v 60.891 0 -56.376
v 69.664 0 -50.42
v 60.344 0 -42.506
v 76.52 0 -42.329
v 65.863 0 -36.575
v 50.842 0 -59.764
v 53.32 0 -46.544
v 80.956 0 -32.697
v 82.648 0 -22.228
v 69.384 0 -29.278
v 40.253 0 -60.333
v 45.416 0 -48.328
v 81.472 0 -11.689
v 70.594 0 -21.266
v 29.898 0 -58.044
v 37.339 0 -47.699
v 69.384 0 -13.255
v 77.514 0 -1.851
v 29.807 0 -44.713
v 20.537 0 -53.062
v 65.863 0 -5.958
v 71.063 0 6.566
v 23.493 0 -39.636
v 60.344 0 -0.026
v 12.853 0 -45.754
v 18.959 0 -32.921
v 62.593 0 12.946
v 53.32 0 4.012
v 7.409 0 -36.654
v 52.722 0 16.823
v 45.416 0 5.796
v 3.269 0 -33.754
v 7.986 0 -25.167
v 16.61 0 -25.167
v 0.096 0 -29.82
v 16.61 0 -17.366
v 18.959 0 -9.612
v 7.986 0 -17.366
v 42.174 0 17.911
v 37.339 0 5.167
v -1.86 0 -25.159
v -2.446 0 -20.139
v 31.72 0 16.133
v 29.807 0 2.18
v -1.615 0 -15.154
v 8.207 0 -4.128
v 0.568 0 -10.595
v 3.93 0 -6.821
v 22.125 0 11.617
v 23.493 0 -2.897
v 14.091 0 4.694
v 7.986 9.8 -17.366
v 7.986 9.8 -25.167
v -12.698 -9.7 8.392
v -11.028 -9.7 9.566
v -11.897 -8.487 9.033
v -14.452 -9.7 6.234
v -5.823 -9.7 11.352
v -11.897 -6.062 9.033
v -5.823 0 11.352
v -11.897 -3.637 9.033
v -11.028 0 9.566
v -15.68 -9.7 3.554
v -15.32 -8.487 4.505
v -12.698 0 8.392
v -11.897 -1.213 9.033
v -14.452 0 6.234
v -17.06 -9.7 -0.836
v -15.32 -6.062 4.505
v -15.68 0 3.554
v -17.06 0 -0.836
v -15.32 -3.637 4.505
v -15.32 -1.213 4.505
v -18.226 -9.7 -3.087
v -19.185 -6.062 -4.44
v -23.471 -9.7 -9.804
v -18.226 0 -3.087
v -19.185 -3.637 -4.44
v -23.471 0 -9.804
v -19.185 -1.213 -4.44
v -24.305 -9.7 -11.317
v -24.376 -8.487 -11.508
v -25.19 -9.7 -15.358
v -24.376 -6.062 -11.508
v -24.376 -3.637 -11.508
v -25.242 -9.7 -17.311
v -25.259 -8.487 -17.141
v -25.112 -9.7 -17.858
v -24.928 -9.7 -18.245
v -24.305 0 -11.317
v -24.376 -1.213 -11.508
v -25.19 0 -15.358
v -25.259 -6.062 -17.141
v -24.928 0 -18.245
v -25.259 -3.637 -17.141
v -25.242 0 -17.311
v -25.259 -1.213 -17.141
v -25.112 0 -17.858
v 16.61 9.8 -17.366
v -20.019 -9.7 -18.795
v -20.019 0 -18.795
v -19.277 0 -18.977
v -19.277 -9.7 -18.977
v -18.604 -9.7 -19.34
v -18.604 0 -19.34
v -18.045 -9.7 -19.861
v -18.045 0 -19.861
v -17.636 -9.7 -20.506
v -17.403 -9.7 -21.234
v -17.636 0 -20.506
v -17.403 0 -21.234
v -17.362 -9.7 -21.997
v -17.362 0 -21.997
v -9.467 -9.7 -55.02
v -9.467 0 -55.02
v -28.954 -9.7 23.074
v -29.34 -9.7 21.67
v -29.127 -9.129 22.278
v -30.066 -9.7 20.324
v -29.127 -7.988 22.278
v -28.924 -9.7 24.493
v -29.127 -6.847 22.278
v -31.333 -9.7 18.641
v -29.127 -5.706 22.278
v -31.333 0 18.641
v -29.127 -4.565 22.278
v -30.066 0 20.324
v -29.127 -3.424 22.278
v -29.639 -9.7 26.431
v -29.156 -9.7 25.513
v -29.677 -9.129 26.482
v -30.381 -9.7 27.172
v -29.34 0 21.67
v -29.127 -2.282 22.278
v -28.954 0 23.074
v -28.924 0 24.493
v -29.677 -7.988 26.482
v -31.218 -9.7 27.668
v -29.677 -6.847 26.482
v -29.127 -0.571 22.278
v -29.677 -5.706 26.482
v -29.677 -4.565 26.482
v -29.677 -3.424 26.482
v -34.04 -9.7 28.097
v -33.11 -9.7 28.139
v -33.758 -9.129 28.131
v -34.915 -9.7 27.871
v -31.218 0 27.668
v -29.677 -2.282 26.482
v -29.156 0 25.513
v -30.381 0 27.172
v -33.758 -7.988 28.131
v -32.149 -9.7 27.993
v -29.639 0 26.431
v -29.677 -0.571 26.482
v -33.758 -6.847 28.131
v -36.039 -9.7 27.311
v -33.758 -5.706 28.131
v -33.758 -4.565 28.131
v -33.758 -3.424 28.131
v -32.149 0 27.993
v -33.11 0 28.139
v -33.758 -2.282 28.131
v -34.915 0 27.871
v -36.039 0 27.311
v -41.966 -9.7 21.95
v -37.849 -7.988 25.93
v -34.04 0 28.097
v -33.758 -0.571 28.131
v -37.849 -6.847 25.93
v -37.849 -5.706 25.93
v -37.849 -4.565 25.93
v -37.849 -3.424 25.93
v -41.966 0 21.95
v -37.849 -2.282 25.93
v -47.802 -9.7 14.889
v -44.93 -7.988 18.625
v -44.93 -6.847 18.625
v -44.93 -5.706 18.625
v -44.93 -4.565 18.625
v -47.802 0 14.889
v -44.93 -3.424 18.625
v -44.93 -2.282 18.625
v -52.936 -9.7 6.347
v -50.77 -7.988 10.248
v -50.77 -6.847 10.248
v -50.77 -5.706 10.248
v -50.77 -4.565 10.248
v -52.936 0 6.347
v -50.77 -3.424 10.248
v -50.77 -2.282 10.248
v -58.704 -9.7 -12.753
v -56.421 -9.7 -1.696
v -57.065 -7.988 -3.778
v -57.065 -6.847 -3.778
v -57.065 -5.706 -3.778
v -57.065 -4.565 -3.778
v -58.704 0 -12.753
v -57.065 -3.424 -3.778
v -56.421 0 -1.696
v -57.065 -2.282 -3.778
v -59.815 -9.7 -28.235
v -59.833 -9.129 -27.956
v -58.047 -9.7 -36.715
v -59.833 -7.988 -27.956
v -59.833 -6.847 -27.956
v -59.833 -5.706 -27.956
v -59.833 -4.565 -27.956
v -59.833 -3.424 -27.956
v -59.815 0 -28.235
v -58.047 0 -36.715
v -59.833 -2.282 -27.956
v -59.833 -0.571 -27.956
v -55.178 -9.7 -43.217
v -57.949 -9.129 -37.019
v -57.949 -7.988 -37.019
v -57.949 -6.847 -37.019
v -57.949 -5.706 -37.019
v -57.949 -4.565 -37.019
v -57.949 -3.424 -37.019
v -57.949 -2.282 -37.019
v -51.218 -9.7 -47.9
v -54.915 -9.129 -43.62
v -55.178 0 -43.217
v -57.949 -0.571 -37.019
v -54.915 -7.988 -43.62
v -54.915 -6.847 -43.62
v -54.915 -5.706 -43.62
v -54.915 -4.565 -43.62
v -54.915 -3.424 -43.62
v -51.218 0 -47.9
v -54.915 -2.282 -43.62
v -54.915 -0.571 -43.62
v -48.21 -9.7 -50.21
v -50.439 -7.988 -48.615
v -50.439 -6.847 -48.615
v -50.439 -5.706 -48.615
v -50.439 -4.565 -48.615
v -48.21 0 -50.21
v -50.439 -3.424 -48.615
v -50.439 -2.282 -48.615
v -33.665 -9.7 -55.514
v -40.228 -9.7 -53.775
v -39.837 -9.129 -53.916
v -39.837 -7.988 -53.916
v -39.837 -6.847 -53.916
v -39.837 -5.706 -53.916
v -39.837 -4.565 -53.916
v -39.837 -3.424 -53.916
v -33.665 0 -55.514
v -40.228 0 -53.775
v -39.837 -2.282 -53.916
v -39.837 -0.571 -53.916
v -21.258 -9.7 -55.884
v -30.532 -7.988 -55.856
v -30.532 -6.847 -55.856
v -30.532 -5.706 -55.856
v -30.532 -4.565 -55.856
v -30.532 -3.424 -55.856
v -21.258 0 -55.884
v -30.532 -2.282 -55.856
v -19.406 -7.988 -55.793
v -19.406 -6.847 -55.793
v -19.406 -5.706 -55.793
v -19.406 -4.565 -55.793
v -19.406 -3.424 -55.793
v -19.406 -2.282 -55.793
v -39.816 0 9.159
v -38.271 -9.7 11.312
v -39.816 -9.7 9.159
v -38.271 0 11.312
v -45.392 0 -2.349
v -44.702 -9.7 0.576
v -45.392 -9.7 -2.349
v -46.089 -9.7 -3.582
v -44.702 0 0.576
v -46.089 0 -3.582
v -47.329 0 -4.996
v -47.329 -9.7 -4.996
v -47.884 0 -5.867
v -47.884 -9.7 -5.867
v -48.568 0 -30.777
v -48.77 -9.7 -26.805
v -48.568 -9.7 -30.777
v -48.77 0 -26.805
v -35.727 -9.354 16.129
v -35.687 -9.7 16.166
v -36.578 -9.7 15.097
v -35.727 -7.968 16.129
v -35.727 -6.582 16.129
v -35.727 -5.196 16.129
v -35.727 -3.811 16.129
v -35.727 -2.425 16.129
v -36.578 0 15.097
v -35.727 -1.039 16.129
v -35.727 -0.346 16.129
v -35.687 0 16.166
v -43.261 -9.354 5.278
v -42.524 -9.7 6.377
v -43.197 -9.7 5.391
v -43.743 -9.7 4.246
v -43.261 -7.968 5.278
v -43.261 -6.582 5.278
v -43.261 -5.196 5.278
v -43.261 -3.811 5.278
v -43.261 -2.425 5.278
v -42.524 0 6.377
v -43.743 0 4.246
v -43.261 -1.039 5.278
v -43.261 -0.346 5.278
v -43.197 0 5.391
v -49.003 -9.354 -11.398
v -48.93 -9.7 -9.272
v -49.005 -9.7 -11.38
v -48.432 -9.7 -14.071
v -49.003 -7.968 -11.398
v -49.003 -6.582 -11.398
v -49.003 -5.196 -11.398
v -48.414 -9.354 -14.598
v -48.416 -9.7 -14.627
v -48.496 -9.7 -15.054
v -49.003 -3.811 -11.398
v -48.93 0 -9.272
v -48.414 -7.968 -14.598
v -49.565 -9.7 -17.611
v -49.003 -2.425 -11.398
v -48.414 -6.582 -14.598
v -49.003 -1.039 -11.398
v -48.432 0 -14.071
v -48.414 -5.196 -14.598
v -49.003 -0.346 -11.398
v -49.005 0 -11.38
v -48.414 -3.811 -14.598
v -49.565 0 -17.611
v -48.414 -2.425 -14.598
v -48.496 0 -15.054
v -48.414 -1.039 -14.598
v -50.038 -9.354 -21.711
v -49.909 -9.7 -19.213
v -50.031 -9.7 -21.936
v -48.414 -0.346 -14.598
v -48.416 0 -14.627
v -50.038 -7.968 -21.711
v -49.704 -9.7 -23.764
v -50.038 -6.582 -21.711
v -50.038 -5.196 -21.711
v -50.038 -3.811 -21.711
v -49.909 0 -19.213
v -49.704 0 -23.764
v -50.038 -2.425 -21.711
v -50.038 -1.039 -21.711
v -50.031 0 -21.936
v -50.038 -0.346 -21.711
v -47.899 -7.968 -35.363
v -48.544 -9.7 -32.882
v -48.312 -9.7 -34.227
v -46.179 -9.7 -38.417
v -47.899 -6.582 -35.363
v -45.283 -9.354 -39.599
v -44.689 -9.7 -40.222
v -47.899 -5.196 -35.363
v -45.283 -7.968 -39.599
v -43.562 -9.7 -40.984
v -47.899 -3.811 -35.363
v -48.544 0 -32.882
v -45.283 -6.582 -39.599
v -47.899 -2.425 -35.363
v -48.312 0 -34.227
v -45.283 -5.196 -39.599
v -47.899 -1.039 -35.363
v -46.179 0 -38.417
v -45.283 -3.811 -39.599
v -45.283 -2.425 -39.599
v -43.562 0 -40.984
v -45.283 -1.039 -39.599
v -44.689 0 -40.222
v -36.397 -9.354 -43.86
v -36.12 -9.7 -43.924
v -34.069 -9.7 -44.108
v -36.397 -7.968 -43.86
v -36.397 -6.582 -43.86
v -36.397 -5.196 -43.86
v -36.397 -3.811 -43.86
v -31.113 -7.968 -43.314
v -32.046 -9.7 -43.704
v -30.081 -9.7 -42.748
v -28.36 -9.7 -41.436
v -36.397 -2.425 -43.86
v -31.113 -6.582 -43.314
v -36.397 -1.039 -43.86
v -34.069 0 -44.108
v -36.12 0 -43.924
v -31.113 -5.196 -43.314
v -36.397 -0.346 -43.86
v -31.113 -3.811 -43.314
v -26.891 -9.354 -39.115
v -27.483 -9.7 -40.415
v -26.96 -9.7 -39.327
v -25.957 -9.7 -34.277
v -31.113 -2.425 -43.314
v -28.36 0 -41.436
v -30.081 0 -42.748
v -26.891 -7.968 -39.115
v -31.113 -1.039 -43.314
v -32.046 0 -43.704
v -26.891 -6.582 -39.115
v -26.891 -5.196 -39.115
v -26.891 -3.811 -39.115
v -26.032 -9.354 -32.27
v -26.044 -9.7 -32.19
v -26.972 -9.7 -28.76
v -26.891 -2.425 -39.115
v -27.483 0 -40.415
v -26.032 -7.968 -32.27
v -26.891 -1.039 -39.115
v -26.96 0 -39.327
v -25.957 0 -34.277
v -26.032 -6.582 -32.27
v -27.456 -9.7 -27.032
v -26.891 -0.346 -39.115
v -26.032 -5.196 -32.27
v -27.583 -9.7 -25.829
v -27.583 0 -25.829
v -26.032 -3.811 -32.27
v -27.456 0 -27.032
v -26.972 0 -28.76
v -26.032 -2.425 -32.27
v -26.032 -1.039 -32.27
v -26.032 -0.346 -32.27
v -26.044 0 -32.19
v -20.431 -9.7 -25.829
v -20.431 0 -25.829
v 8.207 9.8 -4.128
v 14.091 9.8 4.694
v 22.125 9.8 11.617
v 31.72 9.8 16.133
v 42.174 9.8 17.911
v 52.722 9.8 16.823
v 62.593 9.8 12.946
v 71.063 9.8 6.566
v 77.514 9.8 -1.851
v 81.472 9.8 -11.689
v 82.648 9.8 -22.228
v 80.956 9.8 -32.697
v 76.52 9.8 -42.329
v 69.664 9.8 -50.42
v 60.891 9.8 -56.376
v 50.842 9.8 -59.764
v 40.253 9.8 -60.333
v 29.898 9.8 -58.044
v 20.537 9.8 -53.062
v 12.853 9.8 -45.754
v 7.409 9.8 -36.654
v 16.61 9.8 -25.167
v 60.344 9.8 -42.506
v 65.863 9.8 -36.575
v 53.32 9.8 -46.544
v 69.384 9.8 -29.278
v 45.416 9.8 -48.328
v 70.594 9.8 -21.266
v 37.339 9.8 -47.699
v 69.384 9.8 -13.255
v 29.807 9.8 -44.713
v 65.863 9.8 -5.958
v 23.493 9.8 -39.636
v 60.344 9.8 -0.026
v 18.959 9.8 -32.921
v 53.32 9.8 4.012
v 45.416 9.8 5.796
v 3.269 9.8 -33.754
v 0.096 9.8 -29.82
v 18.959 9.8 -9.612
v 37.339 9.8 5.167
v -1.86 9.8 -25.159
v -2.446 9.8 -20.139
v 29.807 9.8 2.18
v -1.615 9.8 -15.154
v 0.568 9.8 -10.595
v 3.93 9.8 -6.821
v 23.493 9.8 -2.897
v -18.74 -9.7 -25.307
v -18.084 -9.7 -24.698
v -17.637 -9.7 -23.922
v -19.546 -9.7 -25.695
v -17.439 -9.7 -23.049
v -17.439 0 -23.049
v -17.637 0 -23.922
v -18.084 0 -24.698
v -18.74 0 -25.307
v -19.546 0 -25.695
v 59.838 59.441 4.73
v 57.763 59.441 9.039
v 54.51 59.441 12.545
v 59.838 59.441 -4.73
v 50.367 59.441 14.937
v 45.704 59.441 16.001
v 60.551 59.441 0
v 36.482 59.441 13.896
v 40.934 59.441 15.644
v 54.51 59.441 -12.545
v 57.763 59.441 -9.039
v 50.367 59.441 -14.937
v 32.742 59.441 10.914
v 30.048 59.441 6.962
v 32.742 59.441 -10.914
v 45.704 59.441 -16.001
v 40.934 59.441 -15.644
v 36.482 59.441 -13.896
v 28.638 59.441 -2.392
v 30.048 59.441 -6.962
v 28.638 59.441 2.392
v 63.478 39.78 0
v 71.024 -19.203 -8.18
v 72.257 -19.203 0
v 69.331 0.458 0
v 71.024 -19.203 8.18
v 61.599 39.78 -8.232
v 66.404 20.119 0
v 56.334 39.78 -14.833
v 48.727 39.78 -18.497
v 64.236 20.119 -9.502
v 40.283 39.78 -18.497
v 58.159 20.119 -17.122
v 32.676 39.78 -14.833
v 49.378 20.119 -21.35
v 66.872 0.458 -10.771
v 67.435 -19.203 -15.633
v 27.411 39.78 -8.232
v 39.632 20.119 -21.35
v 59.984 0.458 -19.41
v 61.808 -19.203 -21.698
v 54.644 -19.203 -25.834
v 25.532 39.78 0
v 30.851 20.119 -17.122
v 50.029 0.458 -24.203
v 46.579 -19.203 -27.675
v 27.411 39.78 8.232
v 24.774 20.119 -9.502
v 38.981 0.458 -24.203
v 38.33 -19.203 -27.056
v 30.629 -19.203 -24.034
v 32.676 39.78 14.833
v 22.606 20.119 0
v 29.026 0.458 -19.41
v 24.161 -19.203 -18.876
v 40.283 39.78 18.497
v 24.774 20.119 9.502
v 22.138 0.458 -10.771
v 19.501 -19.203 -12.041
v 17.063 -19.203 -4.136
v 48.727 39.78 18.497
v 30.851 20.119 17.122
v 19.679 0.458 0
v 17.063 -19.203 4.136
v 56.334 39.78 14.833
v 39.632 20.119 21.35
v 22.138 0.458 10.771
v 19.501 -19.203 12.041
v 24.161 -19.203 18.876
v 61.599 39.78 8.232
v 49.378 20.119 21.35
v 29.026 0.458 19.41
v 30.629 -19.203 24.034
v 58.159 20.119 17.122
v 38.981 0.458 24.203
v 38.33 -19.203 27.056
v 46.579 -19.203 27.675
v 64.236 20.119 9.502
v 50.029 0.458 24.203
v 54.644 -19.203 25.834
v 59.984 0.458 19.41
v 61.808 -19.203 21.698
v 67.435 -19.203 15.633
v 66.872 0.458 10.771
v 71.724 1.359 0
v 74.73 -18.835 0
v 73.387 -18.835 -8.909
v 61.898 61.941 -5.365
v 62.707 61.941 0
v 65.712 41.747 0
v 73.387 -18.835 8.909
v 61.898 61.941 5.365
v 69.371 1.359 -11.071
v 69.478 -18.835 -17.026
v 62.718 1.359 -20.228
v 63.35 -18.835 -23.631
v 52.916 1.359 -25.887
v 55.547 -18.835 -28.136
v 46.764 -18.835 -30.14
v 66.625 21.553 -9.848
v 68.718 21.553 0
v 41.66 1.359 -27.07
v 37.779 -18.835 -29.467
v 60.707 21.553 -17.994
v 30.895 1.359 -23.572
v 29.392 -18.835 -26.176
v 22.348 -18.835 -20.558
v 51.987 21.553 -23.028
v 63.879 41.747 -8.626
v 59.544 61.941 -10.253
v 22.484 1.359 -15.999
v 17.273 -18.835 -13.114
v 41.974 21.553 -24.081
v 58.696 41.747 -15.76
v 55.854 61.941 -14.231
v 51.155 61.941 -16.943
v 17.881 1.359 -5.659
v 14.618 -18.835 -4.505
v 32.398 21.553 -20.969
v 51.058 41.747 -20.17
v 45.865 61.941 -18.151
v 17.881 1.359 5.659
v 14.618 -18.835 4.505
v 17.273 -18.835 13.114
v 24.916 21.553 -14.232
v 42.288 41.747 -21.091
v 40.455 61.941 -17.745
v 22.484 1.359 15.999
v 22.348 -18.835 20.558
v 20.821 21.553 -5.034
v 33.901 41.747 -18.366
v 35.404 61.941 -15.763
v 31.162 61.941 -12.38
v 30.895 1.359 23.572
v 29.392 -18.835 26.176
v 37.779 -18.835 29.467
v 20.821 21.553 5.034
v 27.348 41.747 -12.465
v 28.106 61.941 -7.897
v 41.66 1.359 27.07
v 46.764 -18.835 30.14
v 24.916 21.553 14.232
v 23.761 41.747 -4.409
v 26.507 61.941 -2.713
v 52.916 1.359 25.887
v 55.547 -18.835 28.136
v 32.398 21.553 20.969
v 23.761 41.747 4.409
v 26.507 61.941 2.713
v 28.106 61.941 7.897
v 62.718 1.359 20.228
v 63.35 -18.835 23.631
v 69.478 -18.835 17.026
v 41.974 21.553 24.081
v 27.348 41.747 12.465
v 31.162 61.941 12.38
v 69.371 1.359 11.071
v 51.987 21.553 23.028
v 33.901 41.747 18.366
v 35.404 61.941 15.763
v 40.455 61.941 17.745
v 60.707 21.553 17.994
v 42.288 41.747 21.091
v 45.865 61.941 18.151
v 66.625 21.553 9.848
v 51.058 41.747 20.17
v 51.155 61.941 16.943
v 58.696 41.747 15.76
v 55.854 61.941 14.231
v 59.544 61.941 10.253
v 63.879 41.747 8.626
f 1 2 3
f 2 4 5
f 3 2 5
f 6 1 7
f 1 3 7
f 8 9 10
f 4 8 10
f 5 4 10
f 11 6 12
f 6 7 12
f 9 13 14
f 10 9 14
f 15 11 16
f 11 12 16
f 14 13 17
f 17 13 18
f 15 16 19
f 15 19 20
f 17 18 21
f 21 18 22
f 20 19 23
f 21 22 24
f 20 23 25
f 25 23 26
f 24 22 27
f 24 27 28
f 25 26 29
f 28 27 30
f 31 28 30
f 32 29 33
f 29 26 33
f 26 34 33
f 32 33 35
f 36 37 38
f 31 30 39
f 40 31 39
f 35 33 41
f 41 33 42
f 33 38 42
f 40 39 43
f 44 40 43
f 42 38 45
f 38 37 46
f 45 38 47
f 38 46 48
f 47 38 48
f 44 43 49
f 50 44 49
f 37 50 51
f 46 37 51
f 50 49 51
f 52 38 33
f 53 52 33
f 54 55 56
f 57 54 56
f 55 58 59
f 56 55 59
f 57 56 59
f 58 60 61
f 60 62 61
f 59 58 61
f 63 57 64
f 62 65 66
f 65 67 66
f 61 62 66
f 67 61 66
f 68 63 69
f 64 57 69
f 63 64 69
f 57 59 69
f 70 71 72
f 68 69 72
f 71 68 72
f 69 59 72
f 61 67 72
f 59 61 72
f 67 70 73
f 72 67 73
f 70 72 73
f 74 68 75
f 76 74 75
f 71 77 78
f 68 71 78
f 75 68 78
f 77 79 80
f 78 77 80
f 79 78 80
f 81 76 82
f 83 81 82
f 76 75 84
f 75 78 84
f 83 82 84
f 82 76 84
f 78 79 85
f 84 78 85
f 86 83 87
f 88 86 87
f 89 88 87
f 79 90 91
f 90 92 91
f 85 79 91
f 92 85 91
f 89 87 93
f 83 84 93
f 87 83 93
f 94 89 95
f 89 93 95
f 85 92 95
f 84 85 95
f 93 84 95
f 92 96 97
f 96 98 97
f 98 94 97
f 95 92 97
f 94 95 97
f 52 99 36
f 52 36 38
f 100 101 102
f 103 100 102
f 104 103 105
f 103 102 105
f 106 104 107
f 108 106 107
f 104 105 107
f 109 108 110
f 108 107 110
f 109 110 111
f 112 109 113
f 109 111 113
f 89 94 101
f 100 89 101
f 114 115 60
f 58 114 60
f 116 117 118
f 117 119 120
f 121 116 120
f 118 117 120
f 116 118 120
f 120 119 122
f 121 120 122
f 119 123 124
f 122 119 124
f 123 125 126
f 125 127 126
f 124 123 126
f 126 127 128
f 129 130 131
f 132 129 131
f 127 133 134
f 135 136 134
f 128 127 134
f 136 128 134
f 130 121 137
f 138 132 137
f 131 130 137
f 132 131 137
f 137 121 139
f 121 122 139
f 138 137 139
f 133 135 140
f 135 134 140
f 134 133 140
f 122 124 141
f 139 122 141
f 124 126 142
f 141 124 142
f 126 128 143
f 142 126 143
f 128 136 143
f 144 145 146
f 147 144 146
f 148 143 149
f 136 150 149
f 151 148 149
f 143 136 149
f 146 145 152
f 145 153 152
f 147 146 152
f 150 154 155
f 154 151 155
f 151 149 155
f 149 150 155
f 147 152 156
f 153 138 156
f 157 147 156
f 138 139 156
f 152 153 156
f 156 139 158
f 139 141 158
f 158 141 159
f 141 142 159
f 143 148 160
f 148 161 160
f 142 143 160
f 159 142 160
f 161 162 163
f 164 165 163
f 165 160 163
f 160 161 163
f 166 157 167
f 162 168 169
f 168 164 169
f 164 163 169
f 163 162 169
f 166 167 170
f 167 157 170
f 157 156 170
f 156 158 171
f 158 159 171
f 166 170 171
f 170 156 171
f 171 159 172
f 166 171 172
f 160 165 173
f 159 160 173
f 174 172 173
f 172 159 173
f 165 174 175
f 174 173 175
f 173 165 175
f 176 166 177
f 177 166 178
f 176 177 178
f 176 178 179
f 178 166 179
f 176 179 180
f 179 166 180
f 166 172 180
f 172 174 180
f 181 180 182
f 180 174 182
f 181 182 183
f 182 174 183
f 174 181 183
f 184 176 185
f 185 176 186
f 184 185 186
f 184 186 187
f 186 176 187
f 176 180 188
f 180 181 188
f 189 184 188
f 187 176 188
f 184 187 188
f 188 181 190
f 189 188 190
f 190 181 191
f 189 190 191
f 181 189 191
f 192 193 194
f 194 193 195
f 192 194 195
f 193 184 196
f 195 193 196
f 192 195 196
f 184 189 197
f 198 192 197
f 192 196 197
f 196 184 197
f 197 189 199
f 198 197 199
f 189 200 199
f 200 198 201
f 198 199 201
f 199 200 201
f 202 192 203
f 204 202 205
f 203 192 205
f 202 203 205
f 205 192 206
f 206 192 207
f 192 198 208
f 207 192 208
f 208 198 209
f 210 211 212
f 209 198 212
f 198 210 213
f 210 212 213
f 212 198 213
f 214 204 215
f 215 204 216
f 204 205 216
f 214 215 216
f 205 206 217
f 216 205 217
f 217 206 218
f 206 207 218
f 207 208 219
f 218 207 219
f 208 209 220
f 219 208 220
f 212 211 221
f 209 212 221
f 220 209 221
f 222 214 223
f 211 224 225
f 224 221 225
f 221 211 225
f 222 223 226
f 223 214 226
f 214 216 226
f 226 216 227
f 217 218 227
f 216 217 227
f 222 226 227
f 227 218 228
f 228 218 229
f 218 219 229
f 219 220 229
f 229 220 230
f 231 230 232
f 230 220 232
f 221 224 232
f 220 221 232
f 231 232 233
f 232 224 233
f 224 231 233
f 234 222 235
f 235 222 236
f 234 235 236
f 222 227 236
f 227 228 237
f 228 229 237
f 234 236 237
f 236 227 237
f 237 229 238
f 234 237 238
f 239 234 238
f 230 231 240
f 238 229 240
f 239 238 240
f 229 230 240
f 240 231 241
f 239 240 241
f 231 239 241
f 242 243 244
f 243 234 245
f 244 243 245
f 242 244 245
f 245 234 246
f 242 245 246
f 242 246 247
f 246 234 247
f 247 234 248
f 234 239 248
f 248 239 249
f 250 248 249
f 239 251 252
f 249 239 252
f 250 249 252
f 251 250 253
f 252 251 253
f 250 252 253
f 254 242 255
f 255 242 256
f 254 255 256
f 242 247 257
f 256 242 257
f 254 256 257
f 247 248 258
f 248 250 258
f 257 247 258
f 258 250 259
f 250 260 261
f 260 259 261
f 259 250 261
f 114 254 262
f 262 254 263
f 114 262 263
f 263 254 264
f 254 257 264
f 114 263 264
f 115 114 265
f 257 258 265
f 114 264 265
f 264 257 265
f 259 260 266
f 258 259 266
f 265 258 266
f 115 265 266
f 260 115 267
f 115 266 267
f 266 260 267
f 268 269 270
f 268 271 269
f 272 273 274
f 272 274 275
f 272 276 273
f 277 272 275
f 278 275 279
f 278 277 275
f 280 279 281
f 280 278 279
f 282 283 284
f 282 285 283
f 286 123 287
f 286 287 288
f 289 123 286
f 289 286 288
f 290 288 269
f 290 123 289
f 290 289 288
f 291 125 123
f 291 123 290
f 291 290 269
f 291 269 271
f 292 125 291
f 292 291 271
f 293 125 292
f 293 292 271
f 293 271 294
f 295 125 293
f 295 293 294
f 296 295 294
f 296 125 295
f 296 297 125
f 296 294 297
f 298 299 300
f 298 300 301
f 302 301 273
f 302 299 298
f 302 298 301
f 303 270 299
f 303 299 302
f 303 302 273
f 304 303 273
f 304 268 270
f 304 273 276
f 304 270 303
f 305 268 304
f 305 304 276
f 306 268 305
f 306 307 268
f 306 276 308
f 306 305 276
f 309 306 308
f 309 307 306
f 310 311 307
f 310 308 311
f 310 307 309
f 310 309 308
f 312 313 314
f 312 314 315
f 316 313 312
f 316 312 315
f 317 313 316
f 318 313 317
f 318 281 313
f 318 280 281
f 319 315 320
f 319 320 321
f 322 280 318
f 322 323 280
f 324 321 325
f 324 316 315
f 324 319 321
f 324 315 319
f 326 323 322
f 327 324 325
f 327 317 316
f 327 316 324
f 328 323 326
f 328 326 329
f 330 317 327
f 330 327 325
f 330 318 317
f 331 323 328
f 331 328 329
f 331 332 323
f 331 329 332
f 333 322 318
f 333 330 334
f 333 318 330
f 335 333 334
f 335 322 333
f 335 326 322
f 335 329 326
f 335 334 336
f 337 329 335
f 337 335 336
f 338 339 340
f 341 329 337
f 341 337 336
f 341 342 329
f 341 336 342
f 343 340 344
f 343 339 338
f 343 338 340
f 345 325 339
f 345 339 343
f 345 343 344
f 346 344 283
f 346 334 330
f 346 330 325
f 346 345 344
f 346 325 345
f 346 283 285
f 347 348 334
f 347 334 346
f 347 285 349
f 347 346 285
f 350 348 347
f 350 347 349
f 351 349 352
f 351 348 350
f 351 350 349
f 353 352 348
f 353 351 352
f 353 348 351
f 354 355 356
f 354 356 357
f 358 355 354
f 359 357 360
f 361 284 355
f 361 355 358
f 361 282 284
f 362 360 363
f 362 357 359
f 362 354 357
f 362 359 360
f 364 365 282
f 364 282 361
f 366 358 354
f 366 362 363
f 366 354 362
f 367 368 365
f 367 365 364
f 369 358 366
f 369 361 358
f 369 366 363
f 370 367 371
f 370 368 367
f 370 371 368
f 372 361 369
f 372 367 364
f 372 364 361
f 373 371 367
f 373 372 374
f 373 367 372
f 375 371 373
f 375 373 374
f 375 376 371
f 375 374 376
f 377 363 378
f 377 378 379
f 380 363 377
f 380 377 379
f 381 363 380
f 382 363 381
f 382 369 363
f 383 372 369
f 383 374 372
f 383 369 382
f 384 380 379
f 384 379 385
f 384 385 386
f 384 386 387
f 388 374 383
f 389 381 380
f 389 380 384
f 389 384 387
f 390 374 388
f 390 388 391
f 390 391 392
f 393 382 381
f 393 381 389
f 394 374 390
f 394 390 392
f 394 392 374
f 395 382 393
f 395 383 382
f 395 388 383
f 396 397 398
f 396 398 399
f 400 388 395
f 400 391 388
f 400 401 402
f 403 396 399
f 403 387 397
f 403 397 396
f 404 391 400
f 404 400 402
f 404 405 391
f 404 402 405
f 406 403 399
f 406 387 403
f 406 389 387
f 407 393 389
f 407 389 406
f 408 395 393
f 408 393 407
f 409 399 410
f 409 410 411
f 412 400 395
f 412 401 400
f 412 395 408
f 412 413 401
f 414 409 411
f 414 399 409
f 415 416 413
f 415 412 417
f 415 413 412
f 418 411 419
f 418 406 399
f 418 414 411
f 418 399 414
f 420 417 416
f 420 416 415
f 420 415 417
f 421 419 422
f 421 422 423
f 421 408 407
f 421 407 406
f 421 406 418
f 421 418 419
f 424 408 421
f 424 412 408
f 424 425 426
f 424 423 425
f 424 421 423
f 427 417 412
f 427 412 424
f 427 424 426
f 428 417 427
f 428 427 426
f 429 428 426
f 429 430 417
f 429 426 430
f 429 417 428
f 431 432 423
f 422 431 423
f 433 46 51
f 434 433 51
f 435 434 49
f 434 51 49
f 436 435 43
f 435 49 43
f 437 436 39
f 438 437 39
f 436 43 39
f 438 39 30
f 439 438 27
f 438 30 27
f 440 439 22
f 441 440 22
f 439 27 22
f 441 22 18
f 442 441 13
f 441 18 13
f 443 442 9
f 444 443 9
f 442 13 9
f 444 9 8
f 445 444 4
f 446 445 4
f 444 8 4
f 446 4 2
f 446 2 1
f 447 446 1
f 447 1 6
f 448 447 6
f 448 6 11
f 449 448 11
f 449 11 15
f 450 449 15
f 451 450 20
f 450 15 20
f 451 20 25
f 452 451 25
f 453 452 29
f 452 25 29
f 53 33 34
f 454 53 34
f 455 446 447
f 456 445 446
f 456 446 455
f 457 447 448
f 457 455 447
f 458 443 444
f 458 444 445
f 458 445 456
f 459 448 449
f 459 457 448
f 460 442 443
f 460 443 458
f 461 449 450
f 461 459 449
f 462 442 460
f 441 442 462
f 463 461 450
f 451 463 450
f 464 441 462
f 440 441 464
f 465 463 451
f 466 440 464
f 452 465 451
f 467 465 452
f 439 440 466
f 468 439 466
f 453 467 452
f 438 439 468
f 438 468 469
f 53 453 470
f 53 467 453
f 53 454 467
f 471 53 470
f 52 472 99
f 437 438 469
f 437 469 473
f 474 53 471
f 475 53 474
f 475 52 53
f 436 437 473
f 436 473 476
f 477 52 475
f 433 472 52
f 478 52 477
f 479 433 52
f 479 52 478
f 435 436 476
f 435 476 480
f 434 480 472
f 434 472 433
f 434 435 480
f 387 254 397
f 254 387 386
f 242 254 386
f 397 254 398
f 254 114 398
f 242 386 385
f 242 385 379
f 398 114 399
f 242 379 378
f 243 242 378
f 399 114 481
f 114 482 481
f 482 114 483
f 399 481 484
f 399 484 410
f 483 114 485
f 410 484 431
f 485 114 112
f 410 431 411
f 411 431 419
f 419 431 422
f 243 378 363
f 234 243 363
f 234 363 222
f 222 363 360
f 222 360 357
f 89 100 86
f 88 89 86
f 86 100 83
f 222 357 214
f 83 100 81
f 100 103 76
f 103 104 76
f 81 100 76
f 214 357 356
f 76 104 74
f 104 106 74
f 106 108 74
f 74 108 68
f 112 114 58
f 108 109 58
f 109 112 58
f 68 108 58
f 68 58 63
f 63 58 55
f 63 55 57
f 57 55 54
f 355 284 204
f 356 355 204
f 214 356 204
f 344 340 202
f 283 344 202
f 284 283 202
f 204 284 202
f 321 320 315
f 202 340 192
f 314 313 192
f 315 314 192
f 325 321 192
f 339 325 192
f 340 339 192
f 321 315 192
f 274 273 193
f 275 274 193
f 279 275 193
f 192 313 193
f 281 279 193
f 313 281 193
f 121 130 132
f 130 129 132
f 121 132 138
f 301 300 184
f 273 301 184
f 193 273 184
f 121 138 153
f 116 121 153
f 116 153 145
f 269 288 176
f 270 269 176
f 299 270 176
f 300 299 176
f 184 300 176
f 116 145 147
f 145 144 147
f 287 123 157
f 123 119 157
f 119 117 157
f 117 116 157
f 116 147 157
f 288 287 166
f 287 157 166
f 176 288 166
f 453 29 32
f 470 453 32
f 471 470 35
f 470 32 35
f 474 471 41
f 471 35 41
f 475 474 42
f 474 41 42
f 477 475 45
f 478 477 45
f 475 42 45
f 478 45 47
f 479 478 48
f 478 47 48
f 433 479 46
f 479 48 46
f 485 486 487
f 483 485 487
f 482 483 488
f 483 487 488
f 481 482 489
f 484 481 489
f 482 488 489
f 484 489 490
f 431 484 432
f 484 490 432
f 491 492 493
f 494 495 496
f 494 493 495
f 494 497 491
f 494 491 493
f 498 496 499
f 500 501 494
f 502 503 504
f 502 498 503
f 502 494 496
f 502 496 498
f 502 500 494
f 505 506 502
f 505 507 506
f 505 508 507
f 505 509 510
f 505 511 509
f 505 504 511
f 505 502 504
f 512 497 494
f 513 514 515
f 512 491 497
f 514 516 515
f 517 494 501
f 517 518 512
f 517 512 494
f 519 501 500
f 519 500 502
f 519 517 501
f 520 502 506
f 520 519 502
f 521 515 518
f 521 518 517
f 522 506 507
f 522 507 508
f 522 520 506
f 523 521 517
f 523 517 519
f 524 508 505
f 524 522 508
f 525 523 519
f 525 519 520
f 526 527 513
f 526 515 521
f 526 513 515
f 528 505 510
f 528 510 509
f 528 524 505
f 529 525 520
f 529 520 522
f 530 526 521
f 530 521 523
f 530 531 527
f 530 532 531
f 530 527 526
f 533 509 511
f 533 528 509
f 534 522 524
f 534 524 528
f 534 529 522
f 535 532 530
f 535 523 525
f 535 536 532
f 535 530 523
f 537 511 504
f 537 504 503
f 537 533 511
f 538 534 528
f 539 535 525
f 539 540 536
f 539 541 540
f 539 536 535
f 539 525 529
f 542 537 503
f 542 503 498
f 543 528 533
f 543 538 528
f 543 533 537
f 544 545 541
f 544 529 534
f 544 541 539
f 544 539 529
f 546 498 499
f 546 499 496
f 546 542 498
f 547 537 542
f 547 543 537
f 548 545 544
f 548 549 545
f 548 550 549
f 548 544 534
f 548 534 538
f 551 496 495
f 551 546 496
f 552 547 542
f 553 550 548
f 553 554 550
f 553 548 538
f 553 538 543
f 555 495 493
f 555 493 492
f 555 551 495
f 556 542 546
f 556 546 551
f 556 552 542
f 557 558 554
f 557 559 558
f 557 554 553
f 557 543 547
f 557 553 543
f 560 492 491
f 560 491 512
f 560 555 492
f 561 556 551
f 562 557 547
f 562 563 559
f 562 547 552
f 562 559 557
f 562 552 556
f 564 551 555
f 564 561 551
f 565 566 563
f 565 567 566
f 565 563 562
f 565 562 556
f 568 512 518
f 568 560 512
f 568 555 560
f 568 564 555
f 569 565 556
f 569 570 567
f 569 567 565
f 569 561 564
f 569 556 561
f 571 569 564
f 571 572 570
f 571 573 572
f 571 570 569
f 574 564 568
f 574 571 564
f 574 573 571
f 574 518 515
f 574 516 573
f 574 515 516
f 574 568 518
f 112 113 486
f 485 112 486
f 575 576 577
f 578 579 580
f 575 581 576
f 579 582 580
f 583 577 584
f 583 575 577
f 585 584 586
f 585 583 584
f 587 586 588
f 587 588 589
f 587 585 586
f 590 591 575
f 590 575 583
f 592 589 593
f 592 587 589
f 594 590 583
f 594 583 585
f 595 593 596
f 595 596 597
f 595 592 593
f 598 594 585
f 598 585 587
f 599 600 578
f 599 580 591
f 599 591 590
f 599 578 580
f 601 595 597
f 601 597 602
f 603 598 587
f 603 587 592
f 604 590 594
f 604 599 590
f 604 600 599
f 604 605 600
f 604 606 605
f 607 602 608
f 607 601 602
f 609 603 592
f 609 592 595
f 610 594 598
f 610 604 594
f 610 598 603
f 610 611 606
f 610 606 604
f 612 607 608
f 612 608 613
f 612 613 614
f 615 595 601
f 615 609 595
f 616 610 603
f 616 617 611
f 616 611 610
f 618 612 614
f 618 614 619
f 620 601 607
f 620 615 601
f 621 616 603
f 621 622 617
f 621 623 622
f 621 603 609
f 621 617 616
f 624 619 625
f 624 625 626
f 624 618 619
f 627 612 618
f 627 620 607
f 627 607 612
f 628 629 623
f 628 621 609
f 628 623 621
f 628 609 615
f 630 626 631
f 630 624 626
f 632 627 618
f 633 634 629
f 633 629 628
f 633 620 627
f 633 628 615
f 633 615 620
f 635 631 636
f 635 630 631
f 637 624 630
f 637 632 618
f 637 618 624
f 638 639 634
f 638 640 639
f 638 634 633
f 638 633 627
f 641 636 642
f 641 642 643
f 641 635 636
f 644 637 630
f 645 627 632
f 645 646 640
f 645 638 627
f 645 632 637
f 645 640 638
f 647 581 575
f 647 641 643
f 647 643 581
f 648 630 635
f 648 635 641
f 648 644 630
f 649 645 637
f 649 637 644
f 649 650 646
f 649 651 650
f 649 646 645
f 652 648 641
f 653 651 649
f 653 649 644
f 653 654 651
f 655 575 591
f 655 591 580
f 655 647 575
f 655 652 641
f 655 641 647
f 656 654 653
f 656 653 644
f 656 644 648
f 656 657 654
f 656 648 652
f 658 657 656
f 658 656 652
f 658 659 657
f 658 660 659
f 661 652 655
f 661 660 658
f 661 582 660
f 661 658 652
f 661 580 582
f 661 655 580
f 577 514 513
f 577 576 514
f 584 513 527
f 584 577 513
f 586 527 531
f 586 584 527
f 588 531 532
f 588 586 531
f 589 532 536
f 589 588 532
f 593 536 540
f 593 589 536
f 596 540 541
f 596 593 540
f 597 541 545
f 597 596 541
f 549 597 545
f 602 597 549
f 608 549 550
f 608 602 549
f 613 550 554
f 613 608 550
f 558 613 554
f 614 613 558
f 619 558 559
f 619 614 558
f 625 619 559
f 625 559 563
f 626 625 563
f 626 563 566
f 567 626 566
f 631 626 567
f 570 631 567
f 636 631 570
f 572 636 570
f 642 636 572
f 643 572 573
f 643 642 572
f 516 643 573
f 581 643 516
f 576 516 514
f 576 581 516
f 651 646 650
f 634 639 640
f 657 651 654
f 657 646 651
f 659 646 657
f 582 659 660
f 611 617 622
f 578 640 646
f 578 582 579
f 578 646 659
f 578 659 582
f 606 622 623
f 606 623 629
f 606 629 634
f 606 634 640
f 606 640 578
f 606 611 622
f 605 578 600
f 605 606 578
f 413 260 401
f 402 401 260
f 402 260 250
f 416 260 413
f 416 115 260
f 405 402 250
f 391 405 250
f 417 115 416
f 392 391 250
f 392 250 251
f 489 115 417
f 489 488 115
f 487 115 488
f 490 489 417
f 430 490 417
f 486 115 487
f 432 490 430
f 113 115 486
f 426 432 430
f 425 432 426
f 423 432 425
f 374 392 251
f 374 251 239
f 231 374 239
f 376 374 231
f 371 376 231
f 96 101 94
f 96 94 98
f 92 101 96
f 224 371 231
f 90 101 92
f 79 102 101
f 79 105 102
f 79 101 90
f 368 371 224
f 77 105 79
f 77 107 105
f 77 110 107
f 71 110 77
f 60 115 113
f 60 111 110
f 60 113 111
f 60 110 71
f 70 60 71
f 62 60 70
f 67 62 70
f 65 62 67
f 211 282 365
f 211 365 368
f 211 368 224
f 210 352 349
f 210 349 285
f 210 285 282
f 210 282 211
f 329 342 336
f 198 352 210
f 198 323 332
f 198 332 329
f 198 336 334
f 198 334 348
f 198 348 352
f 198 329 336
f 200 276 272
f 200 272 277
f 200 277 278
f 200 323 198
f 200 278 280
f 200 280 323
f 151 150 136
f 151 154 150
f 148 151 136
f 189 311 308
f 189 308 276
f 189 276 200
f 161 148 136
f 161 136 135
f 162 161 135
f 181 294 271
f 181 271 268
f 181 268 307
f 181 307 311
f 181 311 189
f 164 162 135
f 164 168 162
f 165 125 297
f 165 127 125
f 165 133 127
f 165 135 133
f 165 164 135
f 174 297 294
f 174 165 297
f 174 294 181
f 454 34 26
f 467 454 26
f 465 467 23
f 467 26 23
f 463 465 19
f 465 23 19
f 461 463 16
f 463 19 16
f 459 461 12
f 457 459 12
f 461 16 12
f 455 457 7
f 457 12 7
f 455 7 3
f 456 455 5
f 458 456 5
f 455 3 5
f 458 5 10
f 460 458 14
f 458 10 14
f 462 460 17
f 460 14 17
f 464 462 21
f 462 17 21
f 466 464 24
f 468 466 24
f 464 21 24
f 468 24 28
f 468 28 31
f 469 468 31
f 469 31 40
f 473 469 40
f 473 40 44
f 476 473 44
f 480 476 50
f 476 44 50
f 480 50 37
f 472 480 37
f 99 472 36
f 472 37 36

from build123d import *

# Parameters (mm, degrees)
F1_DEPTH = 9.7
F3_DEPTH = 9.8


with BuildPart() as f1:
    # F0 (on Front) → F1 (new body)
    with BuildSketch(Plane.XZ):
        with BuildLine():
            add(Edge.make_bspline(
                [(-31.3333757222, 18.640736118), (-33.1727114934, 17.7970882373), (-36.5195896179, 16.2619761166), (-37.4930333972, 12.6593919083), (-39.0461997848, 9.8225244734), (-41.199096824, 7.7983253789), (-43.5279457338, 5.5070060521), (-44.6932097972, 1.2910279279), (-44.8023187617, -0.7320528463), (-45.7226739926, -3.5507546568), (-47.818913695, -5.1364697155), (-48.8855289473, -8.5466859176), (-49.2313550672, -11.3085916163), (-48.3313471287, -13.9227831386), (-48.4364258876, -15.2981476849), (-49.7662537849, -17.6085673265), (-50.0297023673, -20.2086327507), (-50.1138183157, -23.1865738702), (-48.8015930461, -25.718500989), (-48.4702763243, -29.2708843284), (-48.6730976636, -32.683622895), (-48.1676072655, -35.3660777048), (-44.955975234, -40.58963588), (-42.3126905256, -41.3996416494), (-35.8375686831, -44.6716292293), (-31.1358783453, -43.7289355521), (-27.2062712896, -40.7339383547), (-26.5967169386, -37.8372490888), (-25.1728106078, -32.2414555896), (-27.6547270088, -27.4768753156), (-27.5832777476, -25.8288142986)],
                knots=[0, 0, 0, 0, 0.045108961, 0.0807133912, 0.1147764125, 0.1473315955, 0.1820888149, 0.2212889935, 0.2491982273, 0.2808231888, 0.3116260211, 0.3470658135, 0.3795614264, 0.4104341468, 0.4325162003, 0.4629331141, 0.4943221321, 0.5267818494, 0.5587886683, 0.5949259788, 0.6297804219, 0.66204662, 0.7076303924, 0.7403389393, 0.7904583761, 0.832388421, 0.8729395212, 0.9051567969, 0.9507102456, 1, 1, 1, 1], degree=3))
            add(Edge.make_bspline(
                [(-31.3333757222, 18.640736118), (-30.4320062638, 19.7634507528), (-28.6323099317, 22.0050902843), (-28.8956366853, 27.0312636271), (-33.9816007458, 28.8533108881), (-38.1662001082, 25.9656392825), (-45.4070016126, 18.5001059196), (-51.0145285467, 10.3558541003), (-58.1193093352, -3.4994420412), (-59.1238821243, -18.2996662283), (-60.4216558617, -27.8747205918), (-58.1528360789, -37.0869457023), (-55.3255862565, -43.8607247304), (-50.4412371886, -48.7584016873), (-47.9995583557, -50.4987335473), (-39.4714279444, -54.3668608816), (-31.4752169576, -56.1975757662), (-19.3033548338, -55.9135783329), (-12.6463619043, -55.309059194), (-9.4669703394, -55.020339787)],
                knots=[0, 0, 0, 0, 0.0428022408, 0.0854600021, 0.1284903685, 0.173642991, 0.2397096875, 0.3060347723, 0.3873309193, 0.4672400432, 0.5315621695, 0.5942474121, 0.651253375, 0.7037522579, 0.7402243089, 0.8017402131, 0.8629266933, 0.934533547, 1, 1, 1, 1], degree=3))
            Line((-9.4669703394, -55.020339787), (-5.8225695975, 11.3519374281))
            add(Edge.make_bspline(
                [(-5.8225695975, 11.3519374281), (-8.0224233901, 10.7776771968), (-12.2777890695, 9.6668364273), (-15.6737325994, 4.7076146732), (-16.8173529684, -1.0679139978), (-19.0518799713, -4.3693484203), (-22.6667898168, -8.8805515103), (-24.6598588857, -11.0671324534), (-25.5351410957, -17.1104490945), (-25.0717973814, -17.9763948929), (-24.9280650169, -18.245017156)],
                knots=[0, 0, 0, 0, 0.1503161894, 0.2907694846, 0.4314216854, 0.5509335782, 0.6892102863, 0.7959418223, 0.9366997685, 1, 1, 1, 1], degree=3))
            Line((-24.9280650169, -18.245017156), (-20.0190857381, -18.7954644344))
            ThreePointArc((-20.0190857381, -18.7954644344), (-18.0449371971, -19.8607745151), (-17.3615042068, -21.9973763447))
            Line((-17.3615042068, -21.9973763447), (-17.4390722894, -23.049410144))
            ThreePointArc((-17.4390722894, -23.049410144), (-18.3891119415, -25.0267437261), (-20.4309508753, -25.8288142986))
            Line((-20.4309508753, -25.8288142986), (-27.5832777476, -25.8288142986))
        make_face()
    extrude(amount=F1_DEPTH)


with BuildPart() as f3:
    # F2 (on face) → F3 (new body)
    with BuildSketch(Plane(origin=(0, 0, 0), x_dir=(-1, 0, 0), z_dir=(0, 1, 0))):
        with BuildLine():
            ThreePointArc((-7.4089076616, -36.6535794328), (2.4457493392, -20.1391219102), (-8.207463032, -4.1281682208))
            ThreePointArc((-8.207463032, -4.1281682208), (-82.6478852009, -22.2283185204), (-7.4089076616, -36.6535794328))
        make_face()
        with BuildLine():
            ThreePointArc((-16.6102497281, -25.166567415), (-70.5937303007, -21.2662150201), (-16.6102498634, -17.3658607528))
            Line((-16.6102498634, -17.3658607528), (-7.9864403233, -17.3658607528))
            Line((-7.9864403233, -17.3658607528), (-7.9864403233, -25.166567415))
            Line((-7.9864403233, -25.166567415), (-16.6102497281, -25.166567415))
        make_face(mode=Mode.SUBTRACT)
    extrude(amount=F3_DEPTH)


with BuildPart() as f5:
    # F4 (on Top) → F5 (revolve)
    with BuildSketch(Plane.XY):
        Polygon((44.5049665868, 61.9413331151), (44.5049665868, 59.4413360975), (60.5511968882, 59.4413360975), (72.2572165055, -19.2033386409), (74.7299711378, -18.8352766668), (62.7066195011, 61.9413331151), align=None)
    revolve(axis=Axis((44.5049665868, 9.8437499255, 0), (0, 1, 0)))


solid = Compound([f1.part, f3.part, f5.part])
